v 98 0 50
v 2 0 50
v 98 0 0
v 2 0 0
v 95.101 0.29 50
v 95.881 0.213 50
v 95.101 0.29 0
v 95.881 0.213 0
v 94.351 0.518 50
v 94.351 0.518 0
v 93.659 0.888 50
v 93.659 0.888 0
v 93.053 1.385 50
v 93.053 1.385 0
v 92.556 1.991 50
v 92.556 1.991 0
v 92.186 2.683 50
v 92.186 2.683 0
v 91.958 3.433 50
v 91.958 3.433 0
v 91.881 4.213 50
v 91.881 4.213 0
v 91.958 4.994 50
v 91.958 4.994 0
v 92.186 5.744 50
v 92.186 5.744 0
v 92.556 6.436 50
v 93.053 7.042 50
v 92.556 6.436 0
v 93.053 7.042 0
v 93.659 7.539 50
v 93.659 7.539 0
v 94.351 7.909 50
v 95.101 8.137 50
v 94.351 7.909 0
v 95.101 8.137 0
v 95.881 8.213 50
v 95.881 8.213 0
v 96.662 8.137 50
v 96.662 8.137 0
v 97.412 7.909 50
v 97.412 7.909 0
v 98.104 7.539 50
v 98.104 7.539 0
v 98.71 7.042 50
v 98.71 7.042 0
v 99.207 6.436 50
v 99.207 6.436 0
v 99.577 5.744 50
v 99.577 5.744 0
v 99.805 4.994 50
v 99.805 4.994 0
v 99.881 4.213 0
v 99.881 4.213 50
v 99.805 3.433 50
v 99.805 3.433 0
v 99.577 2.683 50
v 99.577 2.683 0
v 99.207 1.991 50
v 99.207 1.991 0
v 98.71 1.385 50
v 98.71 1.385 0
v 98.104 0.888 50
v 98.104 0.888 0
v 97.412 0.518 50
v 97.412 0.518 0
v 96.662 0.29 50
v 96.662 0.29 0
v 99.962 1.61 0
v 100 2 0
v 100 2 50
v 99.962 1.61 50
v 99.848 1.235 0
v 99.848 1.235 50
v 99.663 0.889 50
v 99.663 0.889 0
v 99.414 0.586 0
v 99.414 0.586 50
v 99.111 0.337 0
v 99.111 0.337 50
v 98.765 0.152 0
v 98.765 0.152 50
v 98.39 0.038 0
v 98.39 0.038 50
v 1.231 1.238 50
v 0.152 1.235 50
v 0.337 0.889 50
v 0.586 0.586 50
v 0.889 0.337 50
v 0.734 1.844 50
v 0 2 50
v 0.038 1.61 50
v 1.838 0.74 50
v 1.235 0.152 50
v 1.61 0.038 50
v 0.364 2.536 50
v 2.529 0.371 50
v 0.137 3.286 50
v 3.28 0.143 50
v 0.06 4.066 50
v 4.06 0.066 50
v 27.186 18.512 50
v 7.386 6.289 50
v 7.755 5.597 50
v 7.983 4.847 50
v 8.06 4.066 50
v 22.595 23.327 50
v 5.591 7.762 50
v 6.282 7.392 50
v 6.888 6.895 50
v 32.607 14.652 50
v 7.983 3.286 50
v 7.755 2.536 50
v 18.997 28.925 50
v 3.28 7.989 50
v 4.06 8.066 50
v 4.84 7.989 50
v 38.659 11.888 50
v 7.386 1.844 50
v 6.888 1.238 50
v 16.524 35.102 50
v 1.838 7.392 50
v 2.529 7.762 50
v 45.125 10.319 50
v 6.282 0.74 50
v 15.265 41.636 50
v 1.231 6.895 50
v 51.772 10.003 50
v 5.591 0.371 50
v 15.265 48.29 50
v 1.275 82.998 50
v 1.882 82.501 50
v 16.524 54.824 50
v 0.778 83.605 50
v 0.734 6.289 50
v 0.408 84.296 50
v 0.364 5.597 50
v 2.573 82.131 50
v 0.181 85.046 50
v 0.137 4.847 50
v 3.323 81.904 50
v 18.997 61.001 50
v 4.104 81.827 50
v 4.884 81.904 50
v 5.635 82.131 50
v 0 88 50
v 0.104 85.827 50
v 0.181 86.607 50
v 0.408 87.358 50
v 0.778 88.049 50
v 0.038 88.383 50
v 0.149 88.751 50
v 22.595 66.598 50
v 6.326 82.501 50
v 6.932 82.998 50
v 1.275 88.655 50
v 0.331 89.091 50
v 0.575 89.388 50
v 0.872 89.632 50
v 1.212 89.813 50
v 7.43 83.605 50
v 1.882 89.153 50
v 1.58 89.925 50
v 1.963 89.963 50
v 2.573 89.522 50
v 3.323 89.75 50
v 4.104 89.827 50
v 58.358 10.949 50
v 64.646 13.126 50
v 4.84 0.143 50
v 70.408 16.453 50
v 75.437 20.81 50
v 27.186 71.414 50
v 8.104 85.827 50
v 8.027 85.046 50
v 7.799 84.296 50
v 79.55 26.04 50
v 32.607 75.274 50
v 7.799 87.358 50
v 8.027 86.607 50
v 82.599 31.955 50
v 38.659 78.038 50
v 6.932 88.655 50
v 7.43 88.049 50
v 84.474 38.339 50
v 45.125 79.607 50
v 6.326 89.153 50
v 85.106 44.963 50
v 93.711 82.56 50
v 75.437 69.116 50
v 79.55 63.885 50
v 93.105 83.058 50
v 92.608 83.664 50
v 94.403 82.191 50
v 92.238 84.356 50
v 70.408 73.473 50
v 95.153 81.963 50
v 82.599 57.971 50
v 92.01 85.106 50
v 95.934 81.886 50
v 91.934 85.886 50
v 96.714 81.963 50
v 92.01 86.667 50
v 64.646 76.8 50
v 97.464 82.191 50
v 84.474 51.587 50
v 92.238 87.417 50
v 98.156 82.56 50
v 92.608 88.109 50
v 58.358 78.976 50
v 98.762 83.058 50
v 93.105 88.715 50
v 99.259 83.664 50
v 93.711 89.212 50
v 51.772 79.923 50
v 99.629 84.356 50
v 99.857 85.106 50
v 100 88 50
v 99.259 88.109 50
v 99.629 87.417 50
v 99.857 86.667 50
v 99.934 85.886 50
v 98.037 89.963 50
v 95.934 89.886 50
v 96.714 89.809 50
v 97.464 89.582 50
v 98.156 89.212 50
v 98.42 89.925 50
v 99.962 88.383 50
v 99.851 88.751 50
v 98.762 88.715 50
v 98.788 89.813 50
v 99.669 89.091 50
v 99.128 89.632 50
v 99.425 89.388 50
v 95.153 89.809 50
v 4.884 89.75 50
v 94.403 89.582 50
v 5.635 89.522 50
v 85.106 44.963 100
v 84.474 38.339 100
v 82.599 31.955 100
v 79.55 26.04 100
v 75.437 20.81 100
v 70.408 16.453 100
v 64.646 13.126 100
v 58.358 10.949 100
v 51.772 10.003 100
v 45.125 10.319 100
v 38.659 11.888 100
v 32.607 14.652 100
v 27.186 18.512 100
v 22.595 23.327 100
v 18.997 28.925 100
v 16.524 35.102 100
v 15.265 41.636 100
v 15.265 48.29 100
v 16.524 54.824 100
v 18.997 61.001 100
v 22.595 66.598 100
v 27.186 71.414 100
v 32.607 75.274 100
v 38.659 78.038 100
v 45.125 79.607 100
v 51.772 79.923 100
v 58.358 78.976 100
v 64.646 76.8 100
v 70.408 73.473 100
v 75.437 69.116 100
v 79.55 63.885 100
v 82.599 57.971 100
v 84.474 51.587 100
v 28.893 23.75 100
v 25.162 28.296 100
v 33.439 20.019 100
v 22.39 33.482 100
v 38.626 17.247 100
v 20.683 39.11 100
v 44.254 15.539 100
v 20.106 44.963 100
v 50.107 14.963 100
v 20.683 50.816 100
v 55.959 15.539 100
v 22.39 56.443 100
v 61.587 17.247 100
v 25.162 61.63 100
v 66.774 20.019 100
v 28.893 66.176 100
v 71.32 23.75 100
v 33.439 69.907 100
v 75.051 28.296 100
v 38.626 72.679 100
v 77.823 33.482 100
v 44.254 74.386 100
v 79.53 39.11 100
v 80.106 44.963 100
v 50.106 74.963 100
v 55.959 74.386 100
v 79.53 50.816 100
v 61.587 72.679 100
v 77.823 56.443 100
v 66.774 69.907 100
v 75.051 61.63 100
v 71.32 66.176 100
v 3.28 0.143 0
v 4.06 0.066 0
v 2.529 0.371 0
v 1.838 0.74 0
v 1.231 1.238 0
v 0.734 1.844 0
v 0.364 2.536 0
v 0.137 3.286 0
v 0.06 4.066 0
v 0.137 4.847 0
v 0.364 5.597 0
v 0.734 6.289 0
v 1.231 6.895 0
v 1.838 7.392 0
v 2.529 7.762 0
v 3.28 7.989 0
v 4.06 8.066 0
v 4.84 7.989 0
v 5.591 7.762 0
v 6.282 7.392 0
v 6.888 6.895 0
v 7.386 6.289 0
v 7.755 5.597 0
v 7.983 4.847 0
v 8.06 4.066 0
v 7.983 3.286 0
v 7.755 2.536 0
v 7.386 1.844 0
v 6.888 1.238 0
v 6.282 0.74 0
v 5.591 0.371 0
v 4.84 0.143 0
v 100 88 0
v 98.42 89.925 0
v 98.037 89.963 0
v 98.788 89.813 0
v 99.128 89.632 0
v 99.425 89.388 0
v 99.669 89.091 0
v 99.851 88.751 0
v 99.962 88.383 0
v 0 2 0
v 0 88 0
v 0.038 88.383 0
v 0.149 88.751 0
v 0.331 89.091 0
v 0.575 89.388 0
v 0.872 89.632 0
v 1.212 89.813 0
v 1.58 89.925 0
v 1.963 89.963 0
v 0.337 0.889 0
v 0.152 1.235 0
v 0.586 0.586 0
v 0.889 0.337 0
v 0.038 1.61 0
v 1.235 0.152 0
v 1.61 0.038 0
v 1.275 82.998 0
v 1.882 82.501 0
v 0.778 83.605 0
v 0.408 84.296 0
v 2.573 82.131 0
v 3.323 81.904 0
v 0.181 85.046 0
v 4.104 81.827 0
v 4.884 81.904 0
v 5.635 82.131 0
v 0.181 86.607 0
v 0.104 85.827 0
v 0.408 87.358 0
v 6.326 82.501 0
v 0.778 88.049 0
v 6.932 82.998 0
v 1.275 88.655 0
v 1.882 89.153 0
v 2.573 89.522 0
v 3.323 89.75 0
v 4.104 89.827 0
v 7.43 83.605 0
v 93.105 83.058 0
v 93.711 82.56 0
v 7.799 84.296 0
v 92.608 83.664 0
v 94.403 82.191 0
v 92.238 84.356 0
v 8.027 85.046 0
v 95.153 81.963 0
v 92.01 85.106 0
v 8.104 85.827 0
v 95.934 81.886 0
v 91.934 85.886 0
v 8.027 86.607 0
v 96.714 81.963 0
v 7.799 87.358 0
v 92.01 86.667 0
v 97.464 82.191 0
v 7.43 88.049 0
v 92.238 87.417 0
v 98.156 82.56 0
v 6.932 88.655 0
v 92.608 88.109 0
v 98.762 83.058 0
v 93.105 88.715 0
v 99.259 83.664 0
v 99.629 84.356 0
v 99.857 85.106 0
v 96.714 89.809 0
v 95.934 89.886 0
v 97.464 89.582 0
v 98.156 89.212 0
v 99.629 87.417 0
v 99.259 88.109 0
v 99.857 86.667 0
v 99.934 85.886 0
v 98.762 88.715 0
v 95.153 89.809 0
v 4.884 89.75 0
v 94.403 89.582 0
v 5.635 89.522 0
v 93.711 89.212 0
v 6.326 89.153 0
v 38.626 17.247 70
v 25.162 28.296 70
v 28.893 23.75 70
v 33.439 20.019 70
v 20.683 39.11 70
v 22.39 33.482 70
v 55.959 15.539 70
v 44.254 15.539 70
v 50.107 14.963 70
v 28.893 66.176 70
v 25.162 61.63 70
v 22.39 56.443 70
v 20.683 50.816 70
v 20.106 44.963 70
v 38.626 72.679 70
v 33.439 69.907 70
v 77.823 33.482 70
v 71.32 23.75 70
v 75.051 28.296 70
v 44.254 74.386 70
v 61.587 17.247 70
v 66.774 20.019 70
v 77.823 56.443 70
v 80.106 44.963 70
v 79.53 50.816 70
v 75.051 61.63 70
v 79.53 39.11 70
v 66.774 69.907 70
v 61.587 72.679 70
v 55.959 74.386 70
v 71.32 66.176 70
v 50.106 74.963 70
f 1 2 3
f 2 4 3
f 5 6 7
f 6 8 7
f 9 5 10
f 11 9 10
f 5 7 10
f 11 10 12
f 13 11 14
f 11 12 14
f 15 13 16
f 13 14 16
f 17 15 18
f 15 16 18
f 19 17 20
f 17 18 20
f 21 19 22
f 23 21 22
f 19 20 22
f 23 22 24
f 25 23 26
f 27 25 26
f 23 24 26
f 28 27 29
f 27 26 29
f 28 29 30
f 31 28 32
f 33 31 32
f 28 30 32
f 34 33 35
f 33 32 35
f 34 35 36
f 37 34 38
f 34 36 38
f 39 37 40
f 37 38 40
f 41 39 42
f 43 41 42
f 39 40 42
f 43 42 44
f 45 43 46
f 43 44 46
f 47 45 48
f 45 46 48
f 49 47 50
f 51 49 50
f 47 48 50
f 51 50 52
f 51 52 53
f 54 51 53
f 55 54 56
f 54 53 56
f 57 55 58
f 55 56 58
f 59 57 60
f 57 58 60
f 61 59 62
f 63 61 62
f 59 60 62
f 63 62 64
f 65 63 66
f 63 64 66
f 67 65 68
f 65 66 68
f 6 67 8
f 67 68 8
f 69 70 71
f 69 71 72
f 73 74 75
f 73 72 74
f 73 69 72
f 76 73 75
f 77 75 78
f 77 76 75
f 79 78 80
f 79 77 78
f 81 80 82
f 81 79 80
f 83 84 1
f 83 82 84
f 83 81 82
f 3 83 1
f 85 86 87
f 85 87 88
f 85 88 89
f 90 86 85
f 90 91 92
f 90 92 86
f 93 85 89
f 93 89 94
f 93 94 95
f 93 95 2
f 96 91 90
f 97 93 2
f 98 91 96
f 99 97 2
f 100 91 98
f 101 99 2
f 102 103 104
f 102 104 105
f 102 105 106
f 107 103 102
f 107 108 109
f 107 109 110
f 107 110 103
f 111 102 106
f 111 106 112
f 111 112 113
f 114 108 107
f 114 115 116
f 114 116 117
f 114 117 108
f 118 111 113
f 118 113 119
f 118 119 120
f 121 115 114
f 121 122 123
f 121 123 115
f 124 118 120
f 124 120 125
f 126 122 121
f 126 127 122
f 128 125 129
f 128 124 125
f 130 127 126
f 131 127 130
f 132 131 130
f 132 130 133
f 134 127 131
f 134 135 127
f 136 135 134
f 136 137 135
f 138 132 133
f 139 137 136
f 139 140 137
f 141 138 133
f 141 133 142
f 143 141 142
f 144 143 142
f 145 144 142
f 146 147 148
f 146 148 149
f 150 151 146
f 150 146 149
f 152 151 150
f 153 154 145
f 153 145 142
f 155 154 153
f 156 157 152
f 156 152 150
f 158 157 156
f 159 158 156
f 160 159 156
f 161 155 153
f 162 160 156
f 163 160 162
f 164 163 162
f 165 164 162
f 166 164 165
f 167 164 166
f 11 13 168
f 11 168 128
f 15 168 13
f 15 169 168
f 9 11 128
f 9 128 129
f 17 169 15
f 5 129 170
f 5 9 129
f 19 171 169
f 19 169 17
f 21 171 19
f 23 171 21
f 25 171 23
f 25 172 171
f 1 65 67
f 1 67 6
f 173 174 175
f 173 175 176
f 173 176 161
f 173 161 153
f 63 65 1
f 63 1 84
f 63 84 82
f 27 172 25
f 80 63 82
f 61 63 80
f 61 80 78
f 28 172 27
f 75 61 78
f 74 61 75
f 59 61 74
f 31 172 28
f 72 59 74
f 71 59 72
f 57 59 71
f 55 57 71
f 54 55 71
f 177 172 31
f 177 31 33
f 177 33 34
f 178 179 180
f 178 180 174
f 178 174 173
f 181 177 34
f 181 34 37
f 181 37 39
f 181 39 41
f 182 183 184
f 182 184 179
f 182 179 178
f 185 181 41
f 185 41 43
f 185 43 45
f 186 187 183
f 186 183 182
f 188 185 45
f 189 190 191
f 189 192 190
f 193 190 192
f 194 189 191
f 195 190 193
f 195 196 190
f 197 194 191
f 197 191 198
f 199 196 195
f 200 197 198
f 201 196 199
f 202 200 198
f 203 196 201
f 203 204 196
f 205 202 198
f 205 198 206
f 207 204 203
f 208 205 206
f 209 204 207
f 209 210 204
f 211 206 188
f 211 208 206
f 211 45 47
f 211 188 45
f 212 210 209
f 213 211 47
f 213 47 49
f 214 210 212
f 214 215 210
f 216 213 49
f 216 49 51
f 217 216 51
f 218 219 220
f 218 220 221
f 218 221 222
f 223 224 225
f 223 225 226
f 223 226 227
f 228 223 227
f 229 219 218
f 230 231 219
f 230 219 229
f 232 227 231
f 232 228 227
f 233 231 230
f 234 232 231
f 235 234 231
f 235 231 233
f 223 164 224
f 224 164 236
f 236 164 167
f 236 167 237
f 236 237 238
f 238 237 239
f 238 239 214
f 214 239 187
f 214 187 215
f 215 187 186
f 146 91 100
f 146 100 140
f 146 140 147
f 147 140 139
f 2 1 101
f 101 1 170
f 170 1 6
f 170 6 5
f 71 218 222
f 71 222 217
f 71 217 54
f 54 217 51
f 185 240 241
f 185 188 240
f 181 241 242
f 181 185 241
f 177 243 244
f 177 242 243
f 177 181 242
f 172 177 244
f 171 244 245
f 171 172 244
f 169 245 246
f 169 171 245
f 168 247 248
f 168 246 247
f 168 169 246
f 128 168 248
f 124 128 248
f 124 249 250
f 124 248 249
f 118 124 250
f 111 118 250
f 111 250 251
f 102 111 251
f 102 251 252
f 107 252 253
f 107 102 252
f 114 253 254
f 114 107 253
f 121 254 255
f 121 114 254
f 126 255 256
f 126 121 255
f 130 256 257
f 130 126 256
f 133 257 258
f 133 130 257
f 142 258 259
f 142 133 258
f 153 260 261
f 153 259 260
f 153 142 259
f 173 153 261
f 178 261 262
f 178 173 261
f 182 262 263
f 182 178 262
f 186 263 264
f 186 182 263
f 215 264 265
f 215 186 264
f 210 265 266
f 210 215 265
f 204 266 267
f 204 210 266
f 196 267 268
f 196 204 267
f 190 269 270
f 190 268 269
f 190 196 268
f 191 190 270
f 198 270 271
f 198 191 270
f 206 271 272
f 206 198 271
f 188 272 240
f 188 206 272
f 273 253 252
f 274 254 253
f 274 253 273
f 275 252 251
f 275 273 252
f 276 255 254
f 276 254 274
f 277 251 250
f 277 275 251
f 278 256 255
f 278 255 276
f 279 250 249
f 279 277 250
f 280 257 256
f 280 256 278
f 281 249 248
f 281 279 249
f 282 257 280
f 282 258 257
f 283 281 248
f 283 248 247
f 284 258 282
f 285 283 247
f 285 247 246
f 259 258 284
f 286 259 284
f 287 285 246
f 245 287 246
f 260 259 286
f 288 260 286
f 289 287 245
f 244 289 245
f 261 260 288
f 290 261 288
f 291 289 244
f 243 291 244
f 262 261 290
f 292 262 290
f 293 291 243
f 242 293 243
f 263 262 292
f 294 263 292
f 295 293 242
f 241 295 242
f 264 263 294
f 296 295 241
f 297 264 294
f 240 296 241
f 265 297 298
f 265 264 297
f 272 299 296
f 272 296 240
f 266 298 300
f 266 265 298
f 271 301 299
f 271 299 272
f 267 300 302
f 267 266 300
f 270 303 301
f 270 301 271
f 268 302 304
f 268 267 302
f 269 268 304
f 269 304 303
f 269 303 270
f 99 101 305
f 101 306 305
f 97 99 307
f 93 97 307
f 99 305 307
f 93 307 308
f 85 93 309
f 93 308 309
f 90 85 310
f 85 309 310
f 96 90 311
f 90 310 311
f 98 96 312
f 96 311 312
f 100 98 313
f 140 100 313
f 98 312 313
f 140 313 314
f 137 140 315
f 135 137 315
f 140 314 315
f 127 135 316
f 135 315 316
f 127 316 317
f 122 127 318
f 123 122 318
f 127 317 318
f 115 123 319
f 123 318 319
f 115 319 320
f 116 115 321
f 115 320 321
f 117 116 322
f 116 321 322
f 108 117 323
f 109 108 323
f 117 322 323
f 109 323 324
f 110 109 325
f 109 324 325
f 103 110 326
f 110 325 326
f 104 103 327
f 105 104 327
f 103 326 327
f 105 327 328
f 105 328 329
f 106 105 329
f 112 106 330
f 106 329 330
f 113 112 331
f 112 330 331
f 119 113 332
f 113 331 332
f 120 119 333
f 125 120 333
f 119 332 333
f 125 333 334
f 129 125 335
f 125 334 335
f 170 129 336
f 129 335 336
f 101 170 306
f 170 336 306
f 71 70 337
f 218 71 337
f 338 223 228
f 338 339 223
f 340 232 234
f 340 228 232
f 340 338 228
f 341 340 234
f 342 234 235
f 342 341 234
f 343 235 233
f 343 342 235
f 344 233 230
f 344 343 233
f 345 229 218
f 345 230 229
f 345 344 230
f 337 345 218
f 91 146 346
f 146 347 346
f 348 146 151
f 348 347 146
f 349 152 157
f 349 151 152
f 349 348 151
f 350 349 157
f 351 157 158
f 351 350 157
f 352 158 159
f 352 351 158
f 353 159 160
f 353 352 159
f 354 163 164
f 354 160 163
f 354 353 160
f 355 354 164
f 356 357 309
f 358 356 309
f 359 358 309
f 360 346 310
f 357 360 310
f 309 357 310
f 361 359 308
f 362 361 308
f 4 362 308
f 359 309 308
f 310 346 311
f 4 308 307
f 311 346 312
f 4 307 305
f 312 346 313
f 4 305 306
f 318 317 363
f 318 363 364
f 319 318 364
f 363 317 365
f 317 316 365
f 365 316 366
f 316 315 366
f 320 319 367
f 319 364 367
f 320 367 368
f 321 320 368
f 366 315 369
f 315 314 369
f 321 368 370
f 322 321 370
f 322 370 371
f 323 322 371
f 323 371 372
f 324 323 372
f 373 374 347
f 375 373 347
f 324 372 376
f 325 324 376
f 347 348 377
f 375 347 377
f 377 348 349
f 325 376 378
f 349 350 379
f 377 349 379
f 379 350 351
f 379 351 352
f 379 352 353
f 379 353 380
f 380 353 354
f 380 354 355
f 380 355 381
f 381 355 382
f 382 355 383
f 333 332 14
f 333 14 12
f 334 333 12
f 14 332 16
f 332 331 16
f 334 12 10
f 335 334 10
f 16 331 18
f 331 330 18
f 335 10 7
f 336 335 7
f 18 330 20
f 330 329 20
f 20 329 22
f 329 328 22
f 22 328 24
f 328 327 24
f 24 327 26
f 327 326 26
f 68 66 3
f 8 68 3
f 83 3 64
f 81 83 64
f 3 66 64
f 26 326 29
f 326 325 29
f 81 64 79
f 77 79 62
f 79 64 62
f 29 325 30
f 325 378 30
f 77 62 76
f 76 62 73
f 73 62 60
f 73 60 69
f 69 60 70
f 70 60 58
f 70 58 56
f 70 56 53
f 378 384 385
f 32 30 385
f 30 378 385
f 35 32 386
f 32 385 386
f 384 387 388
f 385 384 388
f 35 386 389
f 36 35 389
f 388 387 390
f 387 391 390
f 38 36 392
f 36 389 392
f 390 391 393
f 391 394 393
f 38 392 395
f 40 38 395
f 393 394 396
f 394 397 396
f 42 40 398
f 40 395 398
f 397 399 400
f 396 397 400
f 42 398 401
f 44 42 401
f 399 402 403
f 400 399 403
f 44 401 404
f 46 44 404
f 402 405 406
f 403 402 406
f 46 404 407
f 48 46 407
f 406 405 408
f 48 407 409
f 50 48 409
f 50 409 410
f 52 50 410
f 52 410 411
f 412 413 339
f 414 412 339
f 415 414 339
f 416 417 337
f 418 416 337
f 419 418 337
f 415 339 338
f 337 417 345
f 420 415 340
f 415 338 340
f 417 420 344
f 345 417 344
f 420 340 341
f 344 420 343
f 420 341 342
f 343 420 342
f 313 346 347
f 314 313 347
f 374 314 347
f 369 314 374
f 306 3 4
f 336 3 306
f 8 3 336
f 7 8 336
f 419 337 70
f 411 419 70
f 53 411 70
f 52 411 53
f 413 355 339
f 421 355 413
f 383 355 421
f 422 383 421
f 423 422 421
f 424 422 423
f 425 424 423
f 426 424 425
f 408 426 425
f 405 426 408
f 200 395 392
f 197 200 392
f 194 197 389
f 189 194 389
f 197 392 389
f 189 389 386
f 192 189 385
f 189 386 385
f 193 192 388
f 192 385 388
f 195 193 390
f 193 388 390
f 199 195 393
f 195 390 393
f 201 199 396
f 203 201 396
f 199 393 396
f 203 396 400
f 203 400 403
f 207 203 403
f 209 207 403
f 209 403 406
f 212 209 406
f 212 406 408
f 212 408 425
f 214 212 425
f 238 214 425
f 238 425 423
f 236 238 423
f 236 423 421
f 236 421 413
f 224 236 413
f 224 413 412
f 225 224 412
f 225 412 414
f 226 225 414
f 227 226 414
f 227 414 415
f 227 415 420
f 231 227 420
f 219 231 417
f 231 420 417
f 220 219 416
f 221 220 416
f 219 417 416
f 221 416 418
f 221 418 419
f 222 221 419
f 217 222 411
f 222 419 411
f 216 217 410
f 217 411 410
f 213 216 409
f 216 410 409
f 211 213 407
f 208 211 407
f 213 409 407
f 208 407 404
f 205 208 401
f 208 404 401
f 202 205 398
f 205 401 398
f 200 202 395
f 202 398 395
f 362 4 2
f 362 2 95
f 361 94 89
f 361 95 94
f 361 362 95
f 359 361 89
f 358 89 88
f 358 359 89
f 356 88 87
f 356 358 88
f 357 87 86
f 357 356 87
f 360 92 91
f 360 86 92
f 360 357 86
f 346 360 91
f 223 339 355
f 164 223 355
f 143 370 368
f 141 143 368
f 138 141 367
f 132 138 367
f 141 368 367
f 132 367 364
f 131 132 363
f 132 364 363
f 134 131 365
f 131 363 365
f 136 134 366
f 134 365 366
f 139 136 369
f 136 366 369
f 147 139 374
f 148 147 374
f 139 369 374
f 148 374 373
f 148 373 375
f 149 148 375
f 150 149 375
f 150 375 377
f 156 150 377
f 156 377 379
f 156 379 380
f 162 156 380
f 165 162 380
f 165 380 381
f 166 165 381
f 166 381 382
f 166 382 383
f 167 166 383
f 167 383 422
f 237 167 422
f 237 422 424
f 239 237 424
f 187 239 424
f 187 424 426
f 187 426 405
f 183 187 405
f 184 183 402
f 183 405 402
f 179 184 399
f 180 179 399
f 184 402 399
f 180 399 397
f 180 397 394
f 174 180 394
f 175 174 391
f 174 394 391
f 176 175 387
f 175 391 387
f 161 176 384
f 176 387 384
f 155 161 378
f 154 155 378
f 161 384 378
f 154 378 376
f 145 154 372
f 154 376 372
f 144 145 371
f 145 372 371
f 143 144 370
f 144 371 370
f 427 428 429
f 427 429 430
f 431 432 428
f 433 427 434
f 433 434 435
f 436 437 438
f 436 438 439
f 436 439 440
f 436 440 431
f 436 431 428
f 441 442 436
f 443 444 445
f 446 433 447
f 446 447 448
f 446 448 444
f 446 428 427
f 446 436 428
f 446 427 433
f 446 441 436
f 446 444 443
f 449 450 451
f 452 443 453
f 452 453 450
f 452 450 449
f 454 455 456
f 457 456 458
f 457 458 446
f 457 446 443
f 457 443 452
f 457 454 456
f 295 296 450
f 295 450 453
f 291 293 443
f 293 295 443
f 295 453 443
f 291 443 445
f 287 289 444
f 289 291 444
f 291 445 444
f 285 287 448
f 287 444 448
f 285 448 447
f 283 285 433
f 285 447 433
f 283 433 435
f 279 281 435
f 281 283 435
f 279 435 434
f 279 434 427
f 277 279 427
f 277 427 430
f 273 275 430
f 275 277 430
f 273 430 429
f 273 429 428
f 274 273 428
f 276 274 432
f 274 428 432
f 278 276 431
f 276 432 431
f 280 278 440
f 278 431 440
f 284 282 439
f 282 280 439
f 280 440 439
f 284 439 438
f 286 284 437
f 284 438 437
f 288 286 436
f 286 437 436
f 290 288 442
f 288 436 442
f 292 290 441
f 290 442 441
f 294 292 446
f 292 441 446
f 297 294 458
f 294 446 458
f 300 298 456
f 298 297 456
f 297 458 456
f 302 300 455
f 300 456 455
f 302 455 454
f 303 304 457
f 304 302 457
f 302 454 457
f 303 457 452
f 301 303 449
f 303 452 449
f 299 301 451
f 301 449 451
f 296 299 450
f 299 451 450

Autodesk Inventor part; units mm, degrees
ref_plane "YZ Plane" through (0, 0, 0) normal (1, 0, 0) x (0, 1, 0)
ref_plane "XZ Plane" through (0, 0, 0) normal (0, 1, 0) x (-1, 0, 0)
ref_plane "XY Plane" through (0, 0, 0) normal (0, 0, 1) x (1, 0, 0)
sketch "Boceto1" plane through (0, 0, 0) normal (0, 0, 1) x (1, 0, 0)
  line L0 (2, 0) -> (98, 0)
  line L1 (100, 2) -> (100, 88)
  line L2 (98.0371, 89.9629) -> (1.9629, 89.9629)
  line L3 (0, 88) -> (0, 2)
  arc A0 (1.9629, 89.9629) -> (0, 88) centre (1.9629, 88) ccw
  arc A1 (100, 88) -> (98.0371, 89.9629) centre (98.0371, 88) ccw
  arc A2 (0, 2) -> (2, 0) centre (2, 2) ccw
  arc A3 (98, 0) -> (100, 2) centre (98, 2) ccw
  circle A4 centre (4, 85.9629) radius 4
  circle A5 centre (96, 85.9629) radius 4
  circle A6 centre (4, 4) radius 4
  circle A7 centre (96, 4) radius 4
  point P0 (0, 0)
  point P1 (100, 89.9629)
  point P2 (100, 0)
  point P3 (0, 89.9629)
  dimension "d0" = 100
  dimension "d6" = 8
  dimension "d7" = 8
  dimension "d8" = 8
  dimension "d9" = 8
extrude "Extrusión1" add sketch "Boceto1" along normal blind 50
sketch "Boceto2" plane through (0, 0, 50) normal (0, 0, 1) x (1, 0, 0)
  circle A0 centre (4.1038, 85.8268) radius 4
  circle A1 centre (95.7307, 85.8268) radius 4
  point P0 (0, 0)
  dimension "d12" = 8
  dimension "d13" = 8
hole "Agujero1" at (4.1038, 85.8268, 50) direction (0, 0, -1) diameter 8 end through all
sketch "Boceto3" plane through (0, 0, 50) normal (0, 0, 1) x (1, 0, 0)
  circle A0 centre (95.9335, 85.8863) radius 4
  point P0 (0, 0)
  dimension "d21" = 8
hole "Agujero2" at (95.9335, 85.8863, 50) direction (0, 0, -1) diameter 8 end through all
sketch "Boceto4" plane through (0, 0, 50) normal (0, 0, 1) x (1, 0, 0)
  circle A0 centre (95.8814, 4.2134) radius 4
  point P0 (0, 0)
  dimension "d29" = 8
hole "Agujero3" at (95.8814, 4.2134, 50) direction (0, 0, -1) diameter 8 end through all
sketch "Boceto5" plane through (0, 0, 50) normal (0, 0, 1) x (1, 0, 0)
  circle A0 centre (4.0599, 4.0663) radius 4
  point P0 (0, 0)
  dimension "d37" = 8
hole "Agujero4" at (4.0599, 4.0663, 50) direction (0, 0, -1) diameter 8 end through all
sketch "Boceto6" plane through (0, 0, 50) normal (0, 0, 1) x (1, 0, 0)
  circle A0 centre (50.1065, 44.9629) radius 35
  line L0 (98.0371, 89.9629) -> (1.9629, 89.9629) projected
  line L1 (2, 0) -> (98, 0) projected
  circle A1 centre (50.1065, 44.9629) radius 30
  point P0 (0, 0)
  point P1 (50, 89.9629)
  point P2 (50, 0)
  dimension "d45" = 70
  dimension "d48" = 60
extrude "Extrusión2" add sketch "Boceto6" along normal blind 50
sketch "Boceto7" plane through (50.1065, 44.9629, 50) normal (0, 0, 1) x (1, 0, 0)
  circle A0 centre (0, 0) radius 30
  point P0 (-50.1065, -44.9629)
  dimension "d51" = 60
extrude "Extrusión3" add sketch "Boceto7" along normal blind 20
properties part number "dinamica T1"
